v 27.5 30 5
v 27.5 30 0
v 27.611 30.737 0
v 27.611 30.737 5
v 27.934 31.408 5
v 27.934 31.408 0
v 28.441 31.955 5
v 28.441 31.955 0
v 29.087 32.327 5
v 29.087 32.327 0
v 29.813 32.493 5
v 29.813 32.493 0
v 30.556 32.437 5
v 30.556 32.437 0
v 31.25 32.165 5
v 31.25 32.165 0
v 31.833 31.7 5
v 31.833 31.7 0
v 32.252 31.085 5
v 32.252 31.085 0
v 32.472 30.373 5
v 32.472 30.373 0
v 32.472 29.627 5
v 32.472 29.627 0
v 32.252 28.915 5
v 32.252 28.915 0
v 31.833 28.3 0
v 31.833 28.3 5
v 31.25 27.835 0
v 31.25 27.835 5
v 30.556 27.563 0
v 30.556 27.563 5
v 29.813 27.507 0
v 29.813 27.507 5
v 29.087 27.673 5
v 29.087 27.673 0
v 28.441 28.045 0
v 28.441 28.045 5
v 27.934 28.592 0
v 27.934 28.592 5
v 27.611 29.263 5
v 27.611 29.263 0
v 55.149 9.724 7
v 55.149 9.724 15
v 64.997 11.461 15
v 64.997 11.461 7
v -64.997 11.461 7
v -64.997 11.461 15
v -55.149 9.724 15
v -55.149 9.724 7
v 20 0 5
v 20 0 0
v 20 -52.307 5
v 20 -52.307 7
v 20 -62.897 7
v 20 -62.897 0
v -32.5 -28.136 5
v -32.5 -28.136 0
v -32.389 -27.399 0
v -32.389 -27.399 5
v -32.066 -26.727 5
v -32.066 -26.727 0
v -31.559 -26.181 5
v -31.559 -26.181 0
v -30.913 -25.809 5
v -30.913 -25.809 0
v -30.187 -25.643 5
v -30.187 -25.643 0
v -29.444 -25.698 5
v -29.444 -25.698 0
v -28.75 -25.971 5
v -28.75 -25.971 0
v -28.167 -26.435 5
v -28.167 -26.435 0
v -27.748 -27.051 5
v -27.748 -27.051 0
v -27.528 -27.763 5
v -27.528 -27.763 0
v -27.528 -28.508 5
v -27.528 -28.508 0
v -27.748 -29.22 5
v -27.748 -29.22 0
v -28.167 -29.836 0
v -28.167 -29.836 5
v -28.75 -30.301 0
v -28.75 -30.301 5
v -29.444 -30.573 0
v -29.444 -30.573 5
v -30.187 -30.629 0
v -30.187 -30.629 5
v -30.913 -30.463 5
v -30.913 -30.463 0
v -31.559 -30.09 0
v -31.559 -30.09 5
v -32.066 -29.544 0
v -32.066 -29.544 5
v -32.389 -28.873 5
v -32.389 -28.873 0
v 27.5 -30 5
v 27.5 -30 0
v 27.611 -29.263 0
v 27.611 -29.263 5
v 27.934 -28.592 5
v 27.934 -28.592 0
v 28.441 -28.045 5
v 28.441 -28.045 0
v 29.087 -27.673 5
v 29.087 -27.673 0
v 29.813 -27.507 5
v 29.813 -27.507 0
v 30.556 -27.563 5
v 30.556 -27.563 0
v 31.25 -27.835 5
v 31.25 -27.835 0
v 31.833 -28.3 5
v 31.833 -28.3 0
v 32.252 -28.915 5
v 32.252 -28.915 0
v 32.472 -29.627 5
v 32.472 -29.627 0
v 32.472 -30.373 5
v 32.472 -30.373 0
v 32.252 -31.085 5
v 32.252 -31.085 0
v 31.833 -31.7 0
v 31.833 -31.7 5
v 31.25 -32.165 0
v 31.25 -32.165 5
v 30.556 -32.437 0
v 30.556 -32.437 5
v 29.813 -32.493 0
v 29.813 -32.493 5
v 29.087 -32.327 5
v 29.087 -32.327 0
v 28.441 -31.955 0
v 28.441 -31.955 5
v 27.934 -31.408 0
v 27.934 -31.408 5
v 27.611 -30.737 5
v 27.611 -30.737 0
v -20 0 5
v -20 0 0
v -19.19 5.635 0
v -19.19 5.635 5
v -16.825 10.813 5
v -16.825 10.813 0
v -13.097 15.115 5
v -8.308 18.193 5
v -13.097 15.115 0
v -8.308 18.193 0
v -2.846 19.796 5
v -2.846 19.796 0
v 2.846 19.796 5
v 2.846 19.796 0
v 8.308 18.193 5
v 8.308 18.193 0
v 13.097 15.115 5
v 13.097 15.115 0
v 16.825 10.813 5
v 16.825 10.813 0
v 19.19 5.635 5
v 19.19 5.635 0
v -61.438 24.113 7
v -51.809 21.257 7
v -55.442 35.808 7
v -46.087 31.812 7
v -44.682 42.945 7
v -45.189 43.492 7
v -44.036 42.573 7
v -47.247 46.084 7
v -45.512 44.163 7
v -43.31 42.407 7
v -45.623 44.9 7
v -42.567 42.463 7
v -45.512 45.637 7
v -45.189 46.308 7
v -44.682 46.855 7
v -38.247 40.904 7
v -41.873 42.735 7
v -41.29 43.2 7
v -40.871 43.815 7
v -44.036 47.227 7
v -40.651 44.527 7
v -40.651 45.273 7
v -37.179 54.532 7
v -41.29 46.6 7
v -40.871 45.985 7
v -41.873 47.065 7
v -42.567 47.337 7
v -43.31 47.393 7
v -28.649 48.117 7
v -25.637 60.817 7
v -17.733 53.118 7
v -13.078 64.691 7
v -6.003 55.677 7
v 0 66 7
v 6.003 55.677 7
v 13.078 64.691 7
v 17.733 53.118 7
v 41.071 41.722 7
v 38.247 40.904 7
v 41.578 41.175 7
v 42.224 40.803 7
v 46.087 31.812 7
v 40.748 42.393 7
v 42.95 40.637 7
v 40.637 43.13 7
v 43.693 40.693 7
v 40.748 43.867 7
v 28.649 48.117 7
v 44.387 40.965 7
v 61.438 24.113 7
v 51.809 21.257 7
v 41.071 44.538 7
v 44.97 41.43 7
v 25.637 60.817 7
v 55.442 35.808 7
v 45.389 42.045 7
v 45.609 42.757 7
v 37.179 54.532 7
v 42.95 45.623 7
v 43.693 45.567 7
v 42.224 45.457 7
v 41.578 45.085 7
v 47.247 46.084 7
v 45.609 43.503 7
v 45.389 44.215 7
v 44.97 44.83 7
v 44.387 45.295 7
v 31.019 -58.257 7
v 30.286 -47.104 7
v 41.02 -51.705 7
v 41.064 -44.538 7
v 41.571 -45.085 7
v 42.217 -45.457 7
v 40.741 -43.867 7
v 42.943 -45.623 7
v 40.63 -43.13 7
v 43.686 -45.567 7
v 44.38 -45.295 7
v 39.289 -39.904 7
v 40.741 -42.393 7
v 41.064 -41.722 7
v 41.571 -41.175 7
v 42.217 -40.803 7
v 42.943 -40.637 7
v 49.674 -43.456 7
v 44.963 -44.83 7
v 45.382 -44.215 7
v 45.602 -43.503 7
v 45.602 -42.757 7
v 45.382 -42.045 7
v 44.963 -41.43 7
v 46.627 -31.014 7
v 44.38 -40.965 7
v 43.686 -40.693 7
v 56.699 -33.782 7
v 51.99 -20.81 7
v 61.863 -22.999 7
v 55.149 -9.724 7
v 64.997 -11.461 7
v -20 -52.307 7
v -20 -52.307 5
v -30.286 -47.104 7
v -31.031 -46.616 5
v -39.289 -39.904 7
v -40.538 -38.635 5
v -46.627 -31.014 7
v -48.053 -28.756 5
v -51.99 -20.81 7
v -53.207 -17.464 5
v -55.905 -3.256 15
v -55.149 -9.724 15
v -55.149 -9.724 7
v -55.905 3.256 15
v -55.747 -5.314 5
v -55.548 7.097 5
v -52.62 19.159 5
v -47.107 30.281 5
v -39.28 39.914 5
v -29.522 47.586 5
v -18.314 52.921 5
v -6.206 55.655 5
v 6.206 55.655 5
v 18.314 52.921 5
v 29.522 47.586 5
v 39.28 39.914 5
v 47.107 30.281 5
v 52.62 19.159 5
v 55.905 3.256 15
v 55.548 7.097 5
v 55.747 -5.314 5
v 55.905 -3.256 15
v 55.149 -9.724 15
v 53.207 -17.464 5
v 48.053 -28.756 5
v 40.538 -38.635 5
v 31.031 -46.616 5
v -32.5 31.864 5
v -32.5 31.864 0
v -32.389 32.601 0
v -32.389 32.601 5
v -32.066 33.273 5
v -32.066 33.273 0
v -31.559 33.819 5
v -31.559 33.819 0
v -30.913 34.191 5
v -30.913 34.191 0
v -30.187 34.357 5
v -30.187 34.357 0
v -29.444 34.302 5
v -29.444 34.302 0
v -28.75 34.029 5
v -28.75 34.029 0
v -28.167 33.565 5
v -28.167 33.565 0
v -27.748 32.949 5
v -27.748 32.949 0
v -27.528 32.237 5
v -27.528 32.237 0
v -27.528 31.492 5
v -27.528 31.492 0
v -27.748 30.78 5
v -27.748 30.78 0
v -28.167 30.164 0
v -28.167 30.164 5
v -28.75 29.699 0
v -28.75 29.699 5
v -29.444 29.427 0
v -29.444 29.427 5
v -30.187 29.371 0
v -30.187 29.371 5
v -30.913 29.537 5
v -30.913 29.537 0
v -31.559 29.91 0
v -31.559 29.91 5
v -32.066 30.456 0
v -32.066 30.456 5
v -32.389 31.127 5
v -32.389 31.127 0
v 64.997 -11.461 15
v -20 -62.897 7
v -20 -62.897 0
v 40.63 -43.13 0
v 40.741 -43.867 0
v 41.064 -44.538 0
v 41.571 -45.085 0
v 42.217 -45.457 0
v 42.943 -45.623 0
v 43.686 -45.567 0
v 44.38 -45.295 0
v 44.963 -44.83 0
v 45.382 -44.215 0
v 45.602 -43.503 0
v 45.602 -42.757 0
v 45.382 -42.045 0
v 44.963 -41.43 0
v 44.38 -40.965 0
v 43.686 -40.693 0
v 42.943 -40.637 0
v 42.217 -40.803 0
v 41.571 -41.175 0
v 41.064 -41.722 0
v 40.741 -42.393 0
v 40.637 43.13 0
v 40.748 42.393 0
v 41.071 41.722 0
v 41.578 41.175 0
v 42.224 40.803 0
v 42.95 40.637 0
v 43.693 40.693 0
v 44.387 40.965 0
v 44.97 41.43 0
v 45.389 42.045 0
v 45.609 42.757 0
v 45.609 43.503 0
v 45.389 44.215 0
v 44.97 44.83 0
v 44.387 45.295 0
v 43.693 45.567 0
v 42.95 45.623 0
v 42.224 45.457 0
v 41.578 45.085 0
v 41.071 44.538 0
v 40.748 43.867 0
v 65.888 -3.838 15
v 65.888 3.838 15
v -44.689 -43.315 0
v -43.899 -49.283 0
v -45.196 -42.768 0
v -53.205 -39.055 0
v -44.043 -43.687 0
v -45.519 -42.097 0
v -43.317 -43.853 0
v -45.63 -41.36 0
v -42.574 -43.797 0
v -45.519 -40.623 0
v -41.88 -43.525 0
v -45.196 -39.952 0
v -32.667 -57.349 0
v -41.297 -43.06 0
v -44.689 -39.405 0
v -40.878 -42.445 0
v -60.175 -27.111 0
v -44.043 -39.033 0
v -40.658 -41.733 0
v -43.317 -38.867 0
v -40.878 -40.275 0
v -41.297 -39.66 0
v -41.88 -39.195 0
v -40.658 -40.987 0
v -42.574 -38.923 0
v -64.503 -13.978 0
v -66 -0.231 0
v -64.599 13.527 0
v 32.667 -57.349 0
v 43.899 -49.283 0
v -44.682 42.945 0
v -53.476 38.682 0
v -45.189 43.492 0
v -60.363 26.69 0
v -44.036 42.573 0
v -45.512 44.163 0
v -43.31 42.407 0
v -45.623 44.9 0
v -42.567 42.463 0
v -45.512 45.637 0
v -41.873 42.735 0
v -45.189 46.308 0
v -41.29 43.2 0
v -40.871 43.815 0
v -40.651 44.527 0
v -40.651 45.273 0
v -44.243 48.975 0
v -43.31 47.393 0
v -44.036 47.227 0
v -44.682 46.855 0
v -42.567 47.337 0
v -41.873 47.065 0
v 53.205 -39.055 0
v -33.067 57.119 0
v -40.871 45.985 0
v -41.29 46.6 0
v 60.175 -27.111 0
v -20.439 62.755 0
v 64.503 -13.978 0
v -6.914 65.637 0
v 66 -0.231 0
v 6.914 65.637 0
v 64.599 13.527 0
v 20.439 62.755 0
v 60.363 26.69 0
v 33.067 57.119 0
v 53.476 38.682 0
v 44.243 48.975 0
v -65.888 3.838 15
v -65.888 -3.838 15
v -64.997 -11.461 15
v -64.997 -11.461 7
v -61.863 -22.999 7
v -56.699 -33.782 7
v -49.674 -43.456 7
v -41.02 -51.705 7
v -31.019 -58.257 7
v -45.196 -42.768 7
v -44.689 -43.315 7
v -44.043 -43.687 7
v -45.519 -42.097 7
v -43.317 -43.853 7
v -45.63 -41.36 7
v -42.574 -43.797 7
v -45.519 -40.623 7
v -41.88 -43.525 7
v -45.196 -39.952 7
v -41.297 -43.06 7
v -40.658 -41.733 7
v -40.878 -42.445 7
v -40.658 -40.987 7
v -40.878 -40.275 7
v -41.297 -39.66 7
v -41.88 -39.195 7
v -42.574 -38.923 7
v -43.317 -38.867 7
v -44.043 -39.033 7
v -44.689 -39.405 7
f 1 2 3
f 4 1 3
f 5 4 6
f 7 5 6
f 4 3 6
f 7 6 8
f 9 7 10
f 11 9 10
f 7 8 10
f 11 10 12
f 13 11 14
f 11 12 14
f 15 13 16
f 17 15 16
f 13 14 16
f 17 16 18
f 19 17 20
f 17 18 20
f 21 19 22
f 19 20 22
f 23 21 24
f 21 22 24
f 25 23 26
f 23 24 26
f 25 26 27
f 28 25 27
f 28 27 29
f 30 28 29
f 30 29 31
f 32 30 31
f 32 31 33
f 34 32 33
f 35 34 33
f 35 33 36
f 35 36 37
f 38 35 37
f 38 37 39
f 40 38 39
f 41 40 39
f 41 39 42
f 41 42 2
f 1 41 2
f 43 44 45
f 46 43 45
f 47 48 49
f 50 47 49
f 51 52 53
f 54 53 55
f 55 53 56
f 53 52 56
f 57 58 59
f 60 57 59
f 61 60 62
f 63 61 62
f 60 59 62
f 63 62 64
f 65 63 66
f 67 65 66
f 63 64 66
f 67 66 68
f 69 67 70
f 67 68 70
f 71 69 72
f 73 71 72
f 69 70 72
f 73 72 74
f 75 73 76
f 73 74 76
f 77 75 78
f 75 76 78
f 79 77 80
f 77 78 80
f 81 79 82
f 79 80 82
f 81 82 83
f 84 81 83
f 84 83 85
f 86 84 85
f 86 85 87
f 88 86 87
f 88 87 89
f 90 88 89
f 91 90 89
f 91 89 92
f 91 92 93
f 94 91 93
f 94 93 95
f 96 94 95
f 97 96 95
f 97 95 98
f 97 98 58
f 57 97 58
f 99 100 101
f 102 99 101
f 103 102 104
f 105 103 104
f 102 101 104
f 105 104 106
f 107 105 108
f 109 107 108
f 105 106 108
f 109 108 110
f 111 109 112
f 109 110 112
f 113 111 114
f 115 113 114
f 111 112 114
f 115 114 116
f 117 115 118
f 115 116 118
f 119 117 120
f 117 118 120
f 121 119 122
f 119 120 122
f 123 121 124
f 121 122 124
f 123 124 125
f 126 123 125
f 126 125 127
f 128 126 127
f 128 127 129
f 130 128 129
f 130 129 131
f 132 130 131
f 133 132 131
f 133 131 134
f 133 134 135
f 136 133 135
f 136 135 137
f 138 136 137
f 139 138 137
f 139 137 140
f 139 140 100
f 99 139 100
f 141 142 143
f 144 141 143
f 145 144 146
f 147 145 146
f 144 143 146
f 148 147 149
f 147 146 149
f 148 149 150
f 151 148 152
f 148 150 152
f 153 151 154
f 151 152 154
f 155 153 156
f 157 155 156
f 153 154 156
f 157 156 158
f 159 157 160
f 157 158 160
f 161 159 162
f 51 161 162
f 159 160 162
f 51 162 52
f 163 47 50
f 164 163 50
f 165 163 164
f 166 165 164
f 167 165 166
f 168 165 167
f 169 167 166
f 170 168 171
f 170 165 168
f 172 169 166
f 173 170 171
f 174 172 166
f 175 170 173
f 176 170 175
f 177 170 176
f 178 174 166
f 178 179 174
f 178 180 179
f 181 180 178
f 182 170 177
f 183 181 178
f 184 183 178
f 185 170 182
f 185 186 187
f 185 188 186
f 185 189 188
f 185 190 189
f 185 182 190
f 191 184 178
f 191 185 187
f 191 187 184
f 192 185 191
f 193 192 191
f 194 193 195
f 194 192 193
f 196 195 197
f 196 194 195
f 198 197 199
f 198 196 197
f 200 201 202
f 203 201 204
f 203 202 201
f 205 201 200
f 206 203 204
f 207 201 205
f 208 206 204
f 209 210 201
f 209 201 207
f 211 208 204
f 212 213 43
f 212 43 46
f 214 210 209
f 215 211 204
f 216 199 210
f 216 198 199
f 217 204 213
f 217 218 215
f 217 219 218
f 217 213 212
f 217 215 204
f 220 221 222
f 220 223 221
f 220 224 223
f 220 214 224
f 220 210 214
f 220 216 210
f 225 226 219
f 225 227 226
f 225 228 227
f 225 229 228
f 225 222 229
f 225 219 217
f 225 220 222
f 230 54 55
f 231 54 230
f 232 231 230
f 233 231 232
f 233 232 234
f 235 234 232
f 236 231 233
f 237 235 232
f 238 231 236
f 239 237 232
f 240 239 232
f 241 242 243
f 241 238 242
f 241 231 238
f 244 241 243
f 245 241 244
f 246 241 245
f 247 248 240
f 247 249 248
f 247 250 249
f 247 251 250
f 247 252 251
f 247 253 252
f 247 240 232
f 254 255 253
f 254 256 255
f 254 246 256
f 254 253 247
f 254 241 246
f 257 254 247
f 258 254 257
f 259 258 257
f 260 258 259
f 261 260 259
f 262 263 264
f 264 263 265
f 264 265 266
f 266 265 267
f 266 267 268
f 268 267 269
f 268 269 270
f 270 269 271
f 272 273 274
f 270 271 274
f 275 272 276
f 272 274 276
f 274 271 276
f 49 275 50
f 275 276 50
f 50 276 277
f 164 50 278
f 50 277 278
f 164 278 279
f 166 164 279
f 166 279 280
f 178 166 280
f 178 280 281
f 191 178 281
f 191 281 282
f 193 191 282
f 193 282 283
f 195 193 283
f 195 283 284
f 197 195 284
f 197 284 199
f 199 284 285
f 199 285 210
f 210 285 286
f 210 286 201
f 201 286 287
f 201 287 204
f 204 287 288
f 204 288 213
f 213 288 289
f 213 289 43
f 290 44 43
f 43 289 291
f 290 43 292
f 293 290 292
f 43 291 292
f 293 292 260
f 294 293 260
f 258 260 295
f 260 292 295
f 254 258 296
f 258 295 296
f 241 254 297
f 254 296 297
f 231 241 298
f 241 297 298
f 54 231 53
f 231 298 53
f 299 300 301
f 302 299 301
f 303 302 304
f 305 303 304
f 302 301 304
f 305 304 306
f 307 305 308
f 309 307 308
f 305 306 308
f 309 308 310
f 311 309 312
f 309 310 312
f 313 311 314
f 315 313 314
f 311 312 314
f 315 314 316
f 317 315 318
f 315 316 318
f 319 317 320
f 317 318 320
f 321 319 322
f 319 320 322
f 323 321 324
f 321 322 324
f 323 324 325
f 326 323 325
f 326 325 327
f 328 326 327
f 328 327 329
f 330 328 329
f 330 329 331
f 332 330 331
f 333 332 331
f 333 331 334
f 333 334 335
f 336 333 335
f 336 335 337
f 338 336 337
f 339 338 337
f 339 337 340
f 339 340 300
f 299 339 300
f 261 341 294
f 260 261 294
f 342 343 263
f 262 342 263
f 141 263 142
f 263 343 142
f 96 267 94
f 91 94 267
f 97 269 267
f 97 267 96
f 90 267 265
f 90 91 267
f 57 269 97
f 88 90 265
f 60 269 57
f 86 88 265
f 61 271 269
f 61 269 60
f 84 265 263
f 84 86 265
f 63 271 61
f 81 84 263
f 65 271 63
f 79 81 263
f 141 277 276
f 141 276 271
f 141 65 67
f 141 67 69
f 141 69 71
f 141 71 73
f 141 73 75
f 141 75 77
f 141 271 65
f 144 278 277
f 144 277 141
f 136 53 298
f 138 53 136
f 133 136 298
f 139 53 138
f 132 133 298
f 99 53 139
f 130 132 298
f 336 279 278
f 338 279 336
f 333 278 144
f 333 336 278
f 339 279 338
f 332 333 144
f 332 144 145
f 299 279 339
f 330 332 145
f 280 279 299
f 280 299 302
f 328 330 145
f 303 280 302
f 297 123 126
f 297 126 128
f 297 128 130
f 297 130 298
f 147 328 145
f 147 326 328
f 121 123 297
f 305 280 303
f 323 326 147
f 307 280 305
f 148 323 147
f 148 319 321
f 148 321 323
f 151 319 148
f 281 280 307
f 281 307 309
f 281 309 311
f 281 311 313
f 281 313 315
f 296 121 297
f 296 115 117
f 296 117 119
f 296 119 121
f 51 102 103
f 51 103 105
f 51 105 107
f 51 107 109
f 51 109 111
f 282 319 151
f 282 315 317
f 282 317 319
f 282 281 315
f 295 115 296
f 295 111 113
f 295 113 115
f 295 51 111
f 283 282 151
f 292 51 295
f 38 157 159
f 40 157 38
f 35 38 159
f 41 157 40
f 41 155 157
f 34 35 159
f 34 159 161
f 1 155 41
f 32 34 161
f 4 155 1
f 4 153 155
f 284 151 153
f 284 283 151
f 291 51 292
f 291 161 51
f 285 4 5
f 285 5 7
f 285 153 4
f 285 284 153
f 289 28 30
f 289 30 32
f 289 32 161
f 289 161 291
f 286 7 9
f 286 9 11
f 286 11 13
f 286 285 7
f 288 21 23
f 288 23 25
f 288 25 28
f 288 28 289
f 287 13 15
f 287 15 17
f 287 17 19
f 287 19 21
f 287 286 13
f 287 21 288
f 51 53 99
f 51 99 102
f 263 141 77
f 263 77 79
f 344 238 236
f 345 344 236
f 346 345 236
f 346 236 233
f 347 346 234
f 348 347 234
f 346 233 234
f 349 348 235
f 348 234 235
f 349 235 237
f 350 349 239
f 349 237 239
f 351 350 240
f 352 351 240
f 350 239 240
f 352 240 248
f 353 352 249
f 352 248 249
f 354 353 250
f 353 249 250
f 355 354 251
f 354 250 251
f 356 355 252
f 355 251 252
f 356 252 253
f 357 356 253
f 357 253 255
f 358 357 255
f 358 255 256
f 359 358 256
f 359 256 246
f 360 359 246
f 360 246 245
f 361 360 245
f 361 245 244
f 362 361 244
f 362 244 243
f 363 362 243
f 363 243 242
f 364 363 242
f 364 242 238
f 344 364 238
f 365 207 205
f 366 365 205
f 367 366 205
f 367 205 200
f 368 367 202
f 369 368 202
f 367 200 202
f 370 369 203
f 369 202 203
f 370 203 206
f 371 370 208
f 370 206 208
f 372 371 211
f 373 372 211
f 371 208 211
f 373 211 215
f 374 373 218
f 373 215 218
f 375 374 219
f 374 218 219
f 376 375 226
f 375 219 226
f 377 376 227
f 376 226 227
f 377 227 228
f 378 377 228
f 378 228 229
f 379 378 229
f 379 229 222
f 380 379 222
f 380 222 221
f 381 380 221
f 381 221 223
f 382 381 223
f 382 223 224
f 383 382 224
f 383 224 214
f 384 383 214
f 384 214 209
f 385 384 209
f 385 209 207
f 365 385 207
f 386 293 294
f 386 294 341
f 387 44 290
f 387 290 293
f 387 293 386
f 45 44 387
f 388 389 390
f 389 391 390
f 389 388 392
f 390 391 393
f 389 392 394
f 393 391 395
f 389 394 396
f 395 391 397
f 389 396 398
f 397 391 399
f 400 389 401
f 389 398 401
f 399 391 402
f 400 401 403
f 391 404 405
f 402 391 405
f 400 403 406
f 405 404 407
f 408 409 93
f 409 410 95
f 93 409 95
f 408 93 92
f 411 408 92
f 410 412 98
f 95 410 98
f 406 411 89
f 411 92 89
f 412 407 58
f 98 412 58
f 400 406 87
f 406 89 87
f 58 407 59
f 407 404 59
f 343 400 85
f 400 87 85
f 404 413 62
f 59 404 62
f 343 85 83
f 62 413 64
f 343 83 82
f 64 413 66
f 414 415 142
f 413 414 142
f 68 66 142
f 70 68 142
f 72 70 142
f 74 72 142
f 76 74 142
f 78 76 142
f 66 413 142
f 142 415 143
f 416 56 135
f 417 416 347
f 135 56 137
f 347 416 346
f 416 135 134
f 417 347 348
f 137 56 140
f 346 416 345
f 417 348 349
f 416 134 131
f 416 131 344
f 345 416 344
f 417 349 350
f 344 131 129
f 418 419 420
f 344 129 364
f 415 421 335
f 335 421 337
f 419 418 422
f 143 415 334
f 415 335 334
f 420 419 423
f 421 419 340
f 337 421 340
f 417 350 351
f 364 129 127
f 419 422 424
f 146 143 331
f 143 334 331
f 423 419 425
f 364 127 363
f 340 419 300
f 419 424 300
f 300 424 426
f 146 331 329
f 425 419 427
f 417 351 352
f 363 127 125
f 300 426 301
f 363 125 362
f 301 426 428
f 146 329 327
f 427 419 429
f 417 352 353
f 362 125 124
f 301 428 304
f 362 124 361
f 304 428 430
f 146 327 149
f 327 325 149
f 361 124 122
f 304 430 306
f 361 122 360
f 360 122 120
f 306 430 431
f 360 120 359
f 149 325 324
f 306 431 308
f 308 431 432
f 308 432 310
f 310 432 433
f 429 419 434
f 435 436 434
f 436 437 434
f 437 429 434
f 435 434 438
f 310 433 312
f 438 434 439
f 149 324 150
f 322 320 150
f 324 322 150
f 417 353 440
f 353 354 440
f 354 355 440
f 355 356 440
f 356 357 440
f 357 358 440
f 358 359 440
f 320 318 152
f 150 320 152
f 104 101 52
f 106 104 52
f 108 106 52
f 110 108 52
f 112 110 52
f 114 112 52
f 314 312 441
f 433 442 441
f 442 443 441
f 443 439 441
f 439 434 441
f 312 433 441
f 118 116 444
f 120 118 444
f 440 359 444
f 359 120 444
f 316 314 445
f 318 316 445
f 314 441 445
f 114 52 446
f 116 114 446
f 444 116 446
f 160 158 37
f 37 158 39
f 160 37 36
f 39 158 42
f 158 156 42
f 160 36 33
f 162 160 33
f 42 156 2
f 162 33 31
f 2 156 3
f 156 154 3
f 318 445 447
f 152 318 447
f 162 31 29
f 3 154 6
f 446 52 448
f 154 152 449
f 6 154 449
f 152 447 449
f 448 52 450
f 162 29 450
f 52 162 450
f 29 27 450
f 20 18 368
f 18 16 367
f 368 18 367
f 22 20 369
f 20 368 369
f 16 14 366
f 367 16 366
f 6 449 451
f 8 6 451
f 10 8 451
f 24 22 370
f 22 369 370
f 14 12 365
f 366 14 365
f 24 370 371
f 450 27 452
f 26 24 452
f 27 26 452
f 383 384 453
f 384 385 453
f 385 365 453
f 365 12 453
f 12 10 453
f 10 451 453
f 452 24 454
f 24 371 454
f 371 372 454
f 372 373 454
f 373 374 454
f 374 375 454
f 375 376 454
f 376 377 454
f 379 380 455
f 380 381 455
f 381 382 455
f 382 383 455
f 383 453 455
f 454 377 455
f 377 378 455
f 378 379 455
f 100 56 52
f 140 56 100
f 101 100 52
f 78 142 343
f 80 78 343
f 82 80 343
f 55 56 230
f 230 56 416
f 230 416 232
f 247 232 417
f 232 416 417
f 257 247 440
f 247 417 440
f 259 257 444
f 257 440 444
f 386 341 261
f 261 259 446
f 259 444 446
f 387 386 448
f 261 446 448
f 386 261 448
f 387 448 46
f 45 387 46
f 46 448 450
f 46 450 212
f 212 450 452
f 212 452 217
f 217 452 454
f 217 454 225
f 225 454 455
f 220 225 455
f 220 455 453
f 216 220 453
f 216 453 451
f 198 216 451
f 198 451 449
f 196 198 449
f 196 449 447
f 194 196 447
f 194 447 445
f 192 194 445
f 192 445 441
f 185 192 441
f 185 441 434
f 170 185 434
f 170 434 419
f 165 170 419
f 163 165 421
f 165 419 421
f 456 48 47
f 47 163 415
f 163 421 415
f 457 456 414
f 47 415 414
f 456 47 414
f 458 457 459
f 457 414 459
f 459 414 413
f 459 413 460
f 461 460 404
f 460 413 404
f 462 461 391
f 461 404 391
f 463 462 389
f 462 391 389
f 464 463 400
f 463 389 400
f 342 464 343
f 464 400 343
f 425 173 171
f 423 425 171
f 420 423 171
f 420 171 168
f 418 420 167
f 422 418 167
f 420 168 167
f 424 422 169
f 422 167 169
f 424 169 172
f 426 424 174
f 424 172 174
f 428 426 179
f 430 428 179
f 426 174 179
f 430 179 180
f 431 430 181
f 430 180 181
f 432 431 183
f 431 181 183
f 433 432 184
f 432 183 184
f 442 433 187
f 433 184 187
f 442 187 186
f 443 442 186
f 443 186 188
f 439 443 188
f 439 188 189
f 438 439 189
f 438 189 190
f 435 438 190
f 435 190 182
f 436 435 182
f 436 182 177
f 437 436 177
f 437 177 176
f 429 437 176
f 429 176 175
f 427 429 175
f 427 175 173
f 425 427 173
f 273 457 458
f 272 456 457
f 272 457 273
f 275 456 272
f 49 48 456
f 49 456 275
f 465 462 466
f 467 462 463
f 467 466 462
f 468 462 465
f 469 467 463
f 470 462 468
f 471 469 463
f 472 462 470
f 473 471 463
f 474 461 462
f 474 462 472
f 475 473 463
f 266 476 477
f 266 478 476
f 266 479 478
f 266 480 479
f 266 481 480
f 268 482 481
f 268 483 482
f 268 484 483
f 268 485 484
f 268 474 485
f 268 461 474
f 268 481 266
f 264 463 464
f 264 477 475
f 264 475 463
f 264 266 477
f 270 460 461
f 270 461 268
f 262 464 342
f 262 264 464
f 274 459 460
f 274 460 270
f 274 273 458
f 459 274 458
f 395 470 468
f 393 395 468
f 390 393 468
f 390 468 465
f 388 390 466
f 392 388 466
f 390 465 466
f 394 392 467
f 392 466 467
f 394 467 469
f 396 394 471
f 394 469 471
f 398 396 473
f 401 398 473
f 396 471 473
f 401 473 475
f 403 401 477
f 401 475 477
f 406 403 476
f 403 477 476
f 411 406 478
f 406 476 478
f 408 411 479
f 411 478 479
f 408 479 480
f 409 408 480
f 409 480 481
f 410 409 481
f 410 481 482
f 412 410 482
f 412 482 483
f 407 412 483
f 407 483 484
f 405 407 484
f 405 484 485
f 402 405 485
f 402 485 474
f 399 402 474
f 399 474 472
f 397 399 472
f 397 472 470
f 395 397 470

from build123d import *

# Parameters (mm, degrees)
F1_DEPTH = 15
F3_DEPTH = 5
F5_DEPTH = 8
F8_D     = 5
F9_D     = 5


with BuildPart() as f1:
    # F0 (on Top) → F1 (new body)
    with BuildSketch(Plane.XY):
        with BuildLine():
            Line((20, -52.3067873225), (20, -62.8967407741))
            ThreePointArc((20, -62.8967407741), (0, 66), (-20, -62.8967407741))
            Line((-20, -62.8967407741), (-20, -52.3067873225))
            ThreePointArc((-20, -52.3067873225), (0, 56), (20, -52.3067873225))
        make_face()
    extrude(amount=F1_DEPTH)

    # F2 (on Top) → F3 (join)
    with BuildSketch(Plane.XY):
        with BuildLine():
            Line((20, 0), (20, -52.3067873225))
            ThreePointArc((20, -52.3067873225), (0, 56), (-20, -52.3067873225))
            Line((-20, -52.3067873225), (-20, 0))
            ThreePointArc((-20, 0), (0, 20), (20, 0))
        make_face()
    extrude(amount=F3_DEPTH)

    # F4 (on face) → F5 (cut)
    with BuildSketch(Plane.XY.offset(15)):
        with BuildLine():
            ThreePointArc((20, -62.8967407741), (49.6744428377, -43.4562967677), (64.9973116988, -11.460779726))
            Line((64.9973116988, -11.460779726), (55.1492341687, -9.7242979493))
            ThreePointArc((55.1492341687, -9.7242979493), (43.1876018012, -35.6487173775), (20, -52.3067873225))
            Line((20, -52.3067873225), (20, -62.8967407741))
        make_face()
        with BuildLine():
            Line((-64.9973116988, 11.460779726), (-55.1492341687, 9.7242979493))
            ThreePointArc((-55.1492341687, 9.7242979493), (0, 56), (55.1492341687, 9.7242979493))
            Line((55.1492341687, 9.7242979493), (64.9973116988, 11.460779726))
            ThreePointArc((64.9973116988, 11.460779726), (0, 66), (-64.9973116988, 11.460779726))
        make_face()
        with BuildLine():
            ThreePointArc((-20, -62.8967407741), (0, -66), (20, -62.8967407741))
            Line((20, -62.8967407741), (20, -52.3067873225))
            ThreePointArc((20, -52.3067873225), (0, -56), (-20, -52.3067873225))
            Line((-20, -52.3067873225), (-20, -62.8967407741))
        make_face()
        with BuildLine():
            ThreePointArc((-64.9973116988, -11.460779726), (-49.6744428377, -43.4562967677), (-20, -62.8967407741))
            Line((-20, -62.8967407741), (-20, -52.3067873225))
            ThreePointArc((-20, -52.3067873225), (-43.1876018012, -35.6487173775), (-55.1492341687, -9.7242979493))
            Line((-55.1492341687, -9.7242979493), (-64.9973116988, -11.460779726))
        make_face()
    extrude(amount=-F5_DEPTH, mode=Mode.SUBTRACT)

    # F8 (through all)
    with Locations(Plane(origin=(0, 0, 0), x_dir=(1, 0, 0), z_dir=(0, 0, -1))):
        with Locations((43.13, 43.13), (43.1370270186, -43.13), (-43.13, 41.36), (-43.1229729814, -44.9)):
            Hole(F8_D / 2)

    # F9 (through all)
    with Locations(Plane.XY.offset(5)):
        with Locations((30, -30), (30, 30), (-30, 31.8642704598), (-30, -28.1357295402)):
            Hole(F9_D / 2)


solid = f1.part
